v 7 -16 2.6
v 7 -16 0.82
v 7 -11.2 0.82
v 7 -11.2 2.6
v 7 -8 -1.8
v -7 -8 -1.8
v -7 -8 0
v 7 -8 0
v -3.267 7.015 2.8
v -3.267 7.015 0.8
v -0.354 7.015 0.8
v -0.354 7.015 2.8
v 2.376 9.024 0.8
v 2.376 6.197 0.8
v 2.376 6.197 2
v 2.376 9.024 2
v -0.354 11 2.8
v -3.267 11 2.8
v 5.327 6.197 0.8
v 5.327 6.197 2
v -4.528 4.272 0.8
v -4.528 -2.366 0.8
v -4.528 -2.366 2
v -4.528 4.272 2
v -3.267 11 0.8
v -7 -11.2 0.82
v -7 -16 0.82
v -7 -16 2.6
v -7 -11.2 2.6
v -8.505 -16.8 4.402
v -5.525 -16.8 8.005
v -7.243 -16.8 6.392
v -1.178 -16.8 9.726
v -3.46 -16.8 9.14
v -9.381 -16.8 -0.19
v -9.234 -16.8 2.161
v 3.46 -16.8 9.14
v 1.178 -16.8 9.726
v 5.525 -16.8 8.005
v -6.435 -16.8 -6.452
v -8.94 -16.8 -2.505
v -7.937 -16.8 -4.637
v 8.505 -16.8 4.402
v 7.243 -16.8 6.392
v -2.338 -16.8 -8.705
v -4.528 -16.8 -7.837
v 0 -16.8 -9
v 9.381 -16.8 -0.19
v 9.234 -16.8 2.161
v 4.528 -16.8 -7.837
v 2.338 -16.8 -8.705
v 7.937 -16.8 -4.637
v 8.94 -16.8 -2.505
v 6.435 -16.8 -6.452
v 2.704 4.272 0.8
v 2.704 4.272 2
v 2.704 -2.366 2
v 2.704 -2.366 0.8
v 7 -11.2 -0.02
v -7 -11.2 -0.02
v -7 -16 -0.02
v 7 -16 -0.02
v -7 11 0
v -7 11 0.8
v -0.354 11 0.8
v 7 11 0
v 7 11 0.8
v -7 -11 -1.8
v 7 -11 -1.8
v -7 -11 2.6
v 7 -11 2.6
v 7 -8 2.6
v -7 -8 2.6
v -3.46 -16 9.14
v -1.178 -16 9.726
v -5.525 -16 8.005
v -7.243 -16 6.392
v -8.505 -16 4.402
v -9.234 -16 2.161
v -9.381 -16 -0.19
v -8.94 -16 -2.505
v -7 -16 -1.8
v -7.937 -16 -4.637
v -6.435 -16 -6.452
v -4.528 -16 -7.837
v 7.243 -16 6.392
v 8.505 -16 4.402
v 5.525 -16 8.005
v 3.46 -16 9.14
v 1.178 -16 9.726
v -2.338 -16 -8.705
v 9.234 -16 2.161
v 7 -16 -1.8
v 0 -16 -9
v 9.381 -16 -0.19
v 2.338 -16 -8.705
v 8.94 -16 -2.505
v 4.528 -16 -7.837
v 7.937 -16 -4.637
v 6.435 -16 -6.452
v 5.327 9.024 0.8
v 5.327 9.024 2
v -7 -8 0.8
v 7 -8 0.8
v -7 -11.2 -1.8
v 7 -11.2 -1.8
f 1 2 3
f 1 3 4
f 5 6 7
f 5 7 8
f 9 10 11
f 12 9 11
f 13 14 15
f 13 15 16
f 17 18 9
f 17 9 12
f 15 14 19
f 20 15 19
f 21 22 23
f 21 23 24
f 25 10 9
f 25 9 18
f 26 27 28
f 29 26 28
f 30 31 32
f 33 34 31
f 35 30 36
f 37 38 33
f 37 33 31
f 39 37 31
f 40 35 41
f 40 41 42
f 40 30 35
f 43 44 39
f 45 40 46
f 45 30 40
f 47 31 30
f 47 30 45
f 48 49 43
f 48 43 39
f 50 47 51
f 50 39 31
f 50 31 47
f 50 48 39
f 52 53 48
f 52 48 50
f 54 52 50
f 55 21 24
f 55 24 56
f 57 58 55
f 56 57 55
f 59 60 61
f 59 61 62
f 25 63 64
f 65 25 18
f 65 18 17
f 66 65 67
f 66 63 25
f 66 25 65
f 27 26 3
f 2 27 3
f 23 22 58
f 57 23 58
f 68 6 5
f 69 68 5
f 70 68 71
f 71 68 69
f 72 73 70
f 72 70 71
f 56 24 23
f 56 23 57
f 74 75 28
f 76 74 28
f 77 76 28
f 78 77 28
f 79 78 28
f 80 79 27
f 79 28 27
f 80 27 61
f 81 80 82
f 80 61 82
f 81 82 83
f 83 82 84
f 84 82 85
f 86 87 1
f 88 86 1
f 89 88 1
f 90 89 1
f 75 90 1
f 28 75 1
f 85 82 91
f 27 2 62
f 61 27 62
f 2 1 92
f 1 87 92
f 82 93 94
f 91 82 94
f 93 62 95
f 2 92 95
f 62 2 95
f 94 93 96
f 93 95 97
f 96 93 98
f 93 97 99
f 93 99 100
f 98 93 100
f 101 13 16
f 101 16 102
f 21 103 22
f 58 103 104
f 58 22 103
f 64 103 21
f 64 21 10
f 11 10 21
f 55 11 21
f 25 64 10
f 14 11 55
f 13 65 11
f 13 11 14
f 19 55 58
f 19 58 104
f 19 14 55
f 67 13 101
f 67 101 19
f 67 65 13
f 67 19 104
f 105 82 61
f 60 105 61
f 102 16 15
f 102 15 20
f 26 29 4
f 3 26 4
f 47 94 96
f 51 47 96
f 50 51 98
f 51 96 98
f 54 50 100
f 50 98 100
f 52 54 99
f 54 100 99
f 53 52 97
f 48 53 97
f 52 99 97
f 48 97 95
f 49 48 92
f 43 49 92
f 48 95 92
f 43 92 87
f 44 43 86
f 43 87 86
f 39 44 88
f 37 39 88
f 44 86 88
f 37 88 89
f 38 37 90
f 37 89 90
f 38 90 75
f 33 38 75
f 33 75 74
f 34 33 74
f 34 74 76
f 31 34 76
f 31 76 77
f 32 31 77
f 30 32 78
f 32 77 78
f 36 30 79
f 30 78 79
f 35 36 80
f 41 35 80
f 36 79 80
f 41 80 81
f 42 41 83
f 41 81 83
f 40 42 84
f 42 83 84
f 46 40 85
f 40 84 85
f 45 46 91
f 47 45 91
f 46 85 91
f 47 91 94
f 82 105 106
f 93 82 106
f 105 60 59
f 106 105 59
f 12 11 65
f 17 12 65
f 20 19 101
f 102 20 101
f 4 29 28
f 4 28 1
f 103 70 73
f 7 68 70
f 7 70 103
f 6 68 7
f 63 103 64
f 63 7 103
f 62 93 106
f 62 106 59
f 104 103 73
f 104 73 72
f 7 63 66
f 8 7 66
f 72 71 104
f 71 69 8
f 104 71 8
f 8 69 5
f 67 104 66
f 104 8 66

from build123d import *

# Parameters (mm, degrees)
SKETCH1_W                = 14
SKETCH1_H                = 22
BOSS_EXTRUDE1_DEPTH      = 0.8
BOSS_EXTRUDE2_DEPTH      = 1.8
BOSS_EXTRUDE2_DEPTH_BACK = 2.6
SKETCH2_W                = 14
SKETCH2_H                = 3
SKETCH3_W                = 2.913396267
SKETCH3_H                = 3.984974105
BOSS_EXTRUDE3_DEPTH      = 2
SKETCH4_W                = 7.231858128
SKETCH4_H                = 6.637739472
SKETCH4_W_2              = 2.950106431
SKETCH4_H_2              = 2.82718533
BOSS_EXTRUDE4_DEPTH      = 1.2
BOSS_EXTRUDE5_START      = 0.2
SKETCH5_W                = 14
SKETCH5_H                = 1.78
BOSS_EXTRUDE5_DEPTH      = 4.8
BOSS_EXTRUDE5_2_DEPTH    = 4.8
SKETCH6_R                = 9.4
BOSS_EXTRUDE6_DEPTH      = 0.8


with BuildPart() as part:
    # Sketch1 → Boss-Extrude1 (new body)
    with BuildSketch(Plane.XY):
        Rectangle(SKETCH1_W, SKETCH1_H)
    extrude(amount=BOSS_EXTRUDE1_DEPTH)

    # Sketch2 → Boss-Extrude2 (add, two sides: drawn at the far end of the back side and taken through both)
    with BuildSketch(Plane.XY.offset(0.8).offset(-BOSS_EXTRUDE2_DEPTH_BACK)):
        with Locations((0, -9.5)):
            Rectangle(SKETCH2_W, SKETCH2_H)
    extrude(amount=BOSS_EXTRUDE2_DEPTH + BOSS_EXTRUDE2_DEPTH_BACK)

    # Sketch3 → Boss-Extrude3 (add)
    with BuildSketch(Plane.XY.offset(0.8)):
        with Locations((-1.810292651, 9.007512948)):
            Rectangle(SKETCH3_W, SKETCH3_H)
    extrude(amount=BOSS_EXTRUDE3_DEPTH)

    # Sketch4 → Boss-Extrude4 (add)
    with BuildSketch(Plane.XY.offset(0.8)):
        with Locations((-0.911664835, 0.952638535)):
            Rectangle(SKETCH4_W, SKETCH4_H)
        with Locations((3.851527842, 7.610864857)):
            Rectangle(SKETCH4_W_2, SKETCH4_H_2)
    extrude(amount=BOSS_EXTRUDE4_DEPTH)


with BuildPart() as body_2:
    # Sketch5 → Boss-Extrude5 (new body)
    with BuildSketch(Plane.XZ.offset(11).offset(BOSS_EXTRUDE5_START)):
        with Locations((0, 1.71)):
            Rectangle(SKETCH5_W, SKETCH5_H)
    extrude(amount=BOSS_EXTRUDE5_DEPTH)



with BuildPart() as body_3:
    # Sketch5 → Boss-Extrude5 2 (new body)
    with BuildSketch(Plane.XZ.offset(11).offset(BOSS_EXTRUDE5_START)):
        with Locations((0, -0.91)):
            Rectangle(SKETCH5_W, SKETCH5_H)
    extrude(amount=BOSS_EXTRUDE5_2_DEPTH)


with BuildPart() as body_2_1:
    add(body_2.part)

    add(body_3.part)  # Boss-Extrude6 merges body 3
    # Sketch6 → Boss-Extrude6 (add)
    with BuildSketch(Plane.XZ.offset(16)):
        with Locations(Location((0, 0.4, 0), (0, 0, 270))):
            Circle(SKETCH6_R)
    extrude(amount=BOSS_EXTRUDE6_DEPTH)


solid = Compound([part.part, body_2_1.part])
